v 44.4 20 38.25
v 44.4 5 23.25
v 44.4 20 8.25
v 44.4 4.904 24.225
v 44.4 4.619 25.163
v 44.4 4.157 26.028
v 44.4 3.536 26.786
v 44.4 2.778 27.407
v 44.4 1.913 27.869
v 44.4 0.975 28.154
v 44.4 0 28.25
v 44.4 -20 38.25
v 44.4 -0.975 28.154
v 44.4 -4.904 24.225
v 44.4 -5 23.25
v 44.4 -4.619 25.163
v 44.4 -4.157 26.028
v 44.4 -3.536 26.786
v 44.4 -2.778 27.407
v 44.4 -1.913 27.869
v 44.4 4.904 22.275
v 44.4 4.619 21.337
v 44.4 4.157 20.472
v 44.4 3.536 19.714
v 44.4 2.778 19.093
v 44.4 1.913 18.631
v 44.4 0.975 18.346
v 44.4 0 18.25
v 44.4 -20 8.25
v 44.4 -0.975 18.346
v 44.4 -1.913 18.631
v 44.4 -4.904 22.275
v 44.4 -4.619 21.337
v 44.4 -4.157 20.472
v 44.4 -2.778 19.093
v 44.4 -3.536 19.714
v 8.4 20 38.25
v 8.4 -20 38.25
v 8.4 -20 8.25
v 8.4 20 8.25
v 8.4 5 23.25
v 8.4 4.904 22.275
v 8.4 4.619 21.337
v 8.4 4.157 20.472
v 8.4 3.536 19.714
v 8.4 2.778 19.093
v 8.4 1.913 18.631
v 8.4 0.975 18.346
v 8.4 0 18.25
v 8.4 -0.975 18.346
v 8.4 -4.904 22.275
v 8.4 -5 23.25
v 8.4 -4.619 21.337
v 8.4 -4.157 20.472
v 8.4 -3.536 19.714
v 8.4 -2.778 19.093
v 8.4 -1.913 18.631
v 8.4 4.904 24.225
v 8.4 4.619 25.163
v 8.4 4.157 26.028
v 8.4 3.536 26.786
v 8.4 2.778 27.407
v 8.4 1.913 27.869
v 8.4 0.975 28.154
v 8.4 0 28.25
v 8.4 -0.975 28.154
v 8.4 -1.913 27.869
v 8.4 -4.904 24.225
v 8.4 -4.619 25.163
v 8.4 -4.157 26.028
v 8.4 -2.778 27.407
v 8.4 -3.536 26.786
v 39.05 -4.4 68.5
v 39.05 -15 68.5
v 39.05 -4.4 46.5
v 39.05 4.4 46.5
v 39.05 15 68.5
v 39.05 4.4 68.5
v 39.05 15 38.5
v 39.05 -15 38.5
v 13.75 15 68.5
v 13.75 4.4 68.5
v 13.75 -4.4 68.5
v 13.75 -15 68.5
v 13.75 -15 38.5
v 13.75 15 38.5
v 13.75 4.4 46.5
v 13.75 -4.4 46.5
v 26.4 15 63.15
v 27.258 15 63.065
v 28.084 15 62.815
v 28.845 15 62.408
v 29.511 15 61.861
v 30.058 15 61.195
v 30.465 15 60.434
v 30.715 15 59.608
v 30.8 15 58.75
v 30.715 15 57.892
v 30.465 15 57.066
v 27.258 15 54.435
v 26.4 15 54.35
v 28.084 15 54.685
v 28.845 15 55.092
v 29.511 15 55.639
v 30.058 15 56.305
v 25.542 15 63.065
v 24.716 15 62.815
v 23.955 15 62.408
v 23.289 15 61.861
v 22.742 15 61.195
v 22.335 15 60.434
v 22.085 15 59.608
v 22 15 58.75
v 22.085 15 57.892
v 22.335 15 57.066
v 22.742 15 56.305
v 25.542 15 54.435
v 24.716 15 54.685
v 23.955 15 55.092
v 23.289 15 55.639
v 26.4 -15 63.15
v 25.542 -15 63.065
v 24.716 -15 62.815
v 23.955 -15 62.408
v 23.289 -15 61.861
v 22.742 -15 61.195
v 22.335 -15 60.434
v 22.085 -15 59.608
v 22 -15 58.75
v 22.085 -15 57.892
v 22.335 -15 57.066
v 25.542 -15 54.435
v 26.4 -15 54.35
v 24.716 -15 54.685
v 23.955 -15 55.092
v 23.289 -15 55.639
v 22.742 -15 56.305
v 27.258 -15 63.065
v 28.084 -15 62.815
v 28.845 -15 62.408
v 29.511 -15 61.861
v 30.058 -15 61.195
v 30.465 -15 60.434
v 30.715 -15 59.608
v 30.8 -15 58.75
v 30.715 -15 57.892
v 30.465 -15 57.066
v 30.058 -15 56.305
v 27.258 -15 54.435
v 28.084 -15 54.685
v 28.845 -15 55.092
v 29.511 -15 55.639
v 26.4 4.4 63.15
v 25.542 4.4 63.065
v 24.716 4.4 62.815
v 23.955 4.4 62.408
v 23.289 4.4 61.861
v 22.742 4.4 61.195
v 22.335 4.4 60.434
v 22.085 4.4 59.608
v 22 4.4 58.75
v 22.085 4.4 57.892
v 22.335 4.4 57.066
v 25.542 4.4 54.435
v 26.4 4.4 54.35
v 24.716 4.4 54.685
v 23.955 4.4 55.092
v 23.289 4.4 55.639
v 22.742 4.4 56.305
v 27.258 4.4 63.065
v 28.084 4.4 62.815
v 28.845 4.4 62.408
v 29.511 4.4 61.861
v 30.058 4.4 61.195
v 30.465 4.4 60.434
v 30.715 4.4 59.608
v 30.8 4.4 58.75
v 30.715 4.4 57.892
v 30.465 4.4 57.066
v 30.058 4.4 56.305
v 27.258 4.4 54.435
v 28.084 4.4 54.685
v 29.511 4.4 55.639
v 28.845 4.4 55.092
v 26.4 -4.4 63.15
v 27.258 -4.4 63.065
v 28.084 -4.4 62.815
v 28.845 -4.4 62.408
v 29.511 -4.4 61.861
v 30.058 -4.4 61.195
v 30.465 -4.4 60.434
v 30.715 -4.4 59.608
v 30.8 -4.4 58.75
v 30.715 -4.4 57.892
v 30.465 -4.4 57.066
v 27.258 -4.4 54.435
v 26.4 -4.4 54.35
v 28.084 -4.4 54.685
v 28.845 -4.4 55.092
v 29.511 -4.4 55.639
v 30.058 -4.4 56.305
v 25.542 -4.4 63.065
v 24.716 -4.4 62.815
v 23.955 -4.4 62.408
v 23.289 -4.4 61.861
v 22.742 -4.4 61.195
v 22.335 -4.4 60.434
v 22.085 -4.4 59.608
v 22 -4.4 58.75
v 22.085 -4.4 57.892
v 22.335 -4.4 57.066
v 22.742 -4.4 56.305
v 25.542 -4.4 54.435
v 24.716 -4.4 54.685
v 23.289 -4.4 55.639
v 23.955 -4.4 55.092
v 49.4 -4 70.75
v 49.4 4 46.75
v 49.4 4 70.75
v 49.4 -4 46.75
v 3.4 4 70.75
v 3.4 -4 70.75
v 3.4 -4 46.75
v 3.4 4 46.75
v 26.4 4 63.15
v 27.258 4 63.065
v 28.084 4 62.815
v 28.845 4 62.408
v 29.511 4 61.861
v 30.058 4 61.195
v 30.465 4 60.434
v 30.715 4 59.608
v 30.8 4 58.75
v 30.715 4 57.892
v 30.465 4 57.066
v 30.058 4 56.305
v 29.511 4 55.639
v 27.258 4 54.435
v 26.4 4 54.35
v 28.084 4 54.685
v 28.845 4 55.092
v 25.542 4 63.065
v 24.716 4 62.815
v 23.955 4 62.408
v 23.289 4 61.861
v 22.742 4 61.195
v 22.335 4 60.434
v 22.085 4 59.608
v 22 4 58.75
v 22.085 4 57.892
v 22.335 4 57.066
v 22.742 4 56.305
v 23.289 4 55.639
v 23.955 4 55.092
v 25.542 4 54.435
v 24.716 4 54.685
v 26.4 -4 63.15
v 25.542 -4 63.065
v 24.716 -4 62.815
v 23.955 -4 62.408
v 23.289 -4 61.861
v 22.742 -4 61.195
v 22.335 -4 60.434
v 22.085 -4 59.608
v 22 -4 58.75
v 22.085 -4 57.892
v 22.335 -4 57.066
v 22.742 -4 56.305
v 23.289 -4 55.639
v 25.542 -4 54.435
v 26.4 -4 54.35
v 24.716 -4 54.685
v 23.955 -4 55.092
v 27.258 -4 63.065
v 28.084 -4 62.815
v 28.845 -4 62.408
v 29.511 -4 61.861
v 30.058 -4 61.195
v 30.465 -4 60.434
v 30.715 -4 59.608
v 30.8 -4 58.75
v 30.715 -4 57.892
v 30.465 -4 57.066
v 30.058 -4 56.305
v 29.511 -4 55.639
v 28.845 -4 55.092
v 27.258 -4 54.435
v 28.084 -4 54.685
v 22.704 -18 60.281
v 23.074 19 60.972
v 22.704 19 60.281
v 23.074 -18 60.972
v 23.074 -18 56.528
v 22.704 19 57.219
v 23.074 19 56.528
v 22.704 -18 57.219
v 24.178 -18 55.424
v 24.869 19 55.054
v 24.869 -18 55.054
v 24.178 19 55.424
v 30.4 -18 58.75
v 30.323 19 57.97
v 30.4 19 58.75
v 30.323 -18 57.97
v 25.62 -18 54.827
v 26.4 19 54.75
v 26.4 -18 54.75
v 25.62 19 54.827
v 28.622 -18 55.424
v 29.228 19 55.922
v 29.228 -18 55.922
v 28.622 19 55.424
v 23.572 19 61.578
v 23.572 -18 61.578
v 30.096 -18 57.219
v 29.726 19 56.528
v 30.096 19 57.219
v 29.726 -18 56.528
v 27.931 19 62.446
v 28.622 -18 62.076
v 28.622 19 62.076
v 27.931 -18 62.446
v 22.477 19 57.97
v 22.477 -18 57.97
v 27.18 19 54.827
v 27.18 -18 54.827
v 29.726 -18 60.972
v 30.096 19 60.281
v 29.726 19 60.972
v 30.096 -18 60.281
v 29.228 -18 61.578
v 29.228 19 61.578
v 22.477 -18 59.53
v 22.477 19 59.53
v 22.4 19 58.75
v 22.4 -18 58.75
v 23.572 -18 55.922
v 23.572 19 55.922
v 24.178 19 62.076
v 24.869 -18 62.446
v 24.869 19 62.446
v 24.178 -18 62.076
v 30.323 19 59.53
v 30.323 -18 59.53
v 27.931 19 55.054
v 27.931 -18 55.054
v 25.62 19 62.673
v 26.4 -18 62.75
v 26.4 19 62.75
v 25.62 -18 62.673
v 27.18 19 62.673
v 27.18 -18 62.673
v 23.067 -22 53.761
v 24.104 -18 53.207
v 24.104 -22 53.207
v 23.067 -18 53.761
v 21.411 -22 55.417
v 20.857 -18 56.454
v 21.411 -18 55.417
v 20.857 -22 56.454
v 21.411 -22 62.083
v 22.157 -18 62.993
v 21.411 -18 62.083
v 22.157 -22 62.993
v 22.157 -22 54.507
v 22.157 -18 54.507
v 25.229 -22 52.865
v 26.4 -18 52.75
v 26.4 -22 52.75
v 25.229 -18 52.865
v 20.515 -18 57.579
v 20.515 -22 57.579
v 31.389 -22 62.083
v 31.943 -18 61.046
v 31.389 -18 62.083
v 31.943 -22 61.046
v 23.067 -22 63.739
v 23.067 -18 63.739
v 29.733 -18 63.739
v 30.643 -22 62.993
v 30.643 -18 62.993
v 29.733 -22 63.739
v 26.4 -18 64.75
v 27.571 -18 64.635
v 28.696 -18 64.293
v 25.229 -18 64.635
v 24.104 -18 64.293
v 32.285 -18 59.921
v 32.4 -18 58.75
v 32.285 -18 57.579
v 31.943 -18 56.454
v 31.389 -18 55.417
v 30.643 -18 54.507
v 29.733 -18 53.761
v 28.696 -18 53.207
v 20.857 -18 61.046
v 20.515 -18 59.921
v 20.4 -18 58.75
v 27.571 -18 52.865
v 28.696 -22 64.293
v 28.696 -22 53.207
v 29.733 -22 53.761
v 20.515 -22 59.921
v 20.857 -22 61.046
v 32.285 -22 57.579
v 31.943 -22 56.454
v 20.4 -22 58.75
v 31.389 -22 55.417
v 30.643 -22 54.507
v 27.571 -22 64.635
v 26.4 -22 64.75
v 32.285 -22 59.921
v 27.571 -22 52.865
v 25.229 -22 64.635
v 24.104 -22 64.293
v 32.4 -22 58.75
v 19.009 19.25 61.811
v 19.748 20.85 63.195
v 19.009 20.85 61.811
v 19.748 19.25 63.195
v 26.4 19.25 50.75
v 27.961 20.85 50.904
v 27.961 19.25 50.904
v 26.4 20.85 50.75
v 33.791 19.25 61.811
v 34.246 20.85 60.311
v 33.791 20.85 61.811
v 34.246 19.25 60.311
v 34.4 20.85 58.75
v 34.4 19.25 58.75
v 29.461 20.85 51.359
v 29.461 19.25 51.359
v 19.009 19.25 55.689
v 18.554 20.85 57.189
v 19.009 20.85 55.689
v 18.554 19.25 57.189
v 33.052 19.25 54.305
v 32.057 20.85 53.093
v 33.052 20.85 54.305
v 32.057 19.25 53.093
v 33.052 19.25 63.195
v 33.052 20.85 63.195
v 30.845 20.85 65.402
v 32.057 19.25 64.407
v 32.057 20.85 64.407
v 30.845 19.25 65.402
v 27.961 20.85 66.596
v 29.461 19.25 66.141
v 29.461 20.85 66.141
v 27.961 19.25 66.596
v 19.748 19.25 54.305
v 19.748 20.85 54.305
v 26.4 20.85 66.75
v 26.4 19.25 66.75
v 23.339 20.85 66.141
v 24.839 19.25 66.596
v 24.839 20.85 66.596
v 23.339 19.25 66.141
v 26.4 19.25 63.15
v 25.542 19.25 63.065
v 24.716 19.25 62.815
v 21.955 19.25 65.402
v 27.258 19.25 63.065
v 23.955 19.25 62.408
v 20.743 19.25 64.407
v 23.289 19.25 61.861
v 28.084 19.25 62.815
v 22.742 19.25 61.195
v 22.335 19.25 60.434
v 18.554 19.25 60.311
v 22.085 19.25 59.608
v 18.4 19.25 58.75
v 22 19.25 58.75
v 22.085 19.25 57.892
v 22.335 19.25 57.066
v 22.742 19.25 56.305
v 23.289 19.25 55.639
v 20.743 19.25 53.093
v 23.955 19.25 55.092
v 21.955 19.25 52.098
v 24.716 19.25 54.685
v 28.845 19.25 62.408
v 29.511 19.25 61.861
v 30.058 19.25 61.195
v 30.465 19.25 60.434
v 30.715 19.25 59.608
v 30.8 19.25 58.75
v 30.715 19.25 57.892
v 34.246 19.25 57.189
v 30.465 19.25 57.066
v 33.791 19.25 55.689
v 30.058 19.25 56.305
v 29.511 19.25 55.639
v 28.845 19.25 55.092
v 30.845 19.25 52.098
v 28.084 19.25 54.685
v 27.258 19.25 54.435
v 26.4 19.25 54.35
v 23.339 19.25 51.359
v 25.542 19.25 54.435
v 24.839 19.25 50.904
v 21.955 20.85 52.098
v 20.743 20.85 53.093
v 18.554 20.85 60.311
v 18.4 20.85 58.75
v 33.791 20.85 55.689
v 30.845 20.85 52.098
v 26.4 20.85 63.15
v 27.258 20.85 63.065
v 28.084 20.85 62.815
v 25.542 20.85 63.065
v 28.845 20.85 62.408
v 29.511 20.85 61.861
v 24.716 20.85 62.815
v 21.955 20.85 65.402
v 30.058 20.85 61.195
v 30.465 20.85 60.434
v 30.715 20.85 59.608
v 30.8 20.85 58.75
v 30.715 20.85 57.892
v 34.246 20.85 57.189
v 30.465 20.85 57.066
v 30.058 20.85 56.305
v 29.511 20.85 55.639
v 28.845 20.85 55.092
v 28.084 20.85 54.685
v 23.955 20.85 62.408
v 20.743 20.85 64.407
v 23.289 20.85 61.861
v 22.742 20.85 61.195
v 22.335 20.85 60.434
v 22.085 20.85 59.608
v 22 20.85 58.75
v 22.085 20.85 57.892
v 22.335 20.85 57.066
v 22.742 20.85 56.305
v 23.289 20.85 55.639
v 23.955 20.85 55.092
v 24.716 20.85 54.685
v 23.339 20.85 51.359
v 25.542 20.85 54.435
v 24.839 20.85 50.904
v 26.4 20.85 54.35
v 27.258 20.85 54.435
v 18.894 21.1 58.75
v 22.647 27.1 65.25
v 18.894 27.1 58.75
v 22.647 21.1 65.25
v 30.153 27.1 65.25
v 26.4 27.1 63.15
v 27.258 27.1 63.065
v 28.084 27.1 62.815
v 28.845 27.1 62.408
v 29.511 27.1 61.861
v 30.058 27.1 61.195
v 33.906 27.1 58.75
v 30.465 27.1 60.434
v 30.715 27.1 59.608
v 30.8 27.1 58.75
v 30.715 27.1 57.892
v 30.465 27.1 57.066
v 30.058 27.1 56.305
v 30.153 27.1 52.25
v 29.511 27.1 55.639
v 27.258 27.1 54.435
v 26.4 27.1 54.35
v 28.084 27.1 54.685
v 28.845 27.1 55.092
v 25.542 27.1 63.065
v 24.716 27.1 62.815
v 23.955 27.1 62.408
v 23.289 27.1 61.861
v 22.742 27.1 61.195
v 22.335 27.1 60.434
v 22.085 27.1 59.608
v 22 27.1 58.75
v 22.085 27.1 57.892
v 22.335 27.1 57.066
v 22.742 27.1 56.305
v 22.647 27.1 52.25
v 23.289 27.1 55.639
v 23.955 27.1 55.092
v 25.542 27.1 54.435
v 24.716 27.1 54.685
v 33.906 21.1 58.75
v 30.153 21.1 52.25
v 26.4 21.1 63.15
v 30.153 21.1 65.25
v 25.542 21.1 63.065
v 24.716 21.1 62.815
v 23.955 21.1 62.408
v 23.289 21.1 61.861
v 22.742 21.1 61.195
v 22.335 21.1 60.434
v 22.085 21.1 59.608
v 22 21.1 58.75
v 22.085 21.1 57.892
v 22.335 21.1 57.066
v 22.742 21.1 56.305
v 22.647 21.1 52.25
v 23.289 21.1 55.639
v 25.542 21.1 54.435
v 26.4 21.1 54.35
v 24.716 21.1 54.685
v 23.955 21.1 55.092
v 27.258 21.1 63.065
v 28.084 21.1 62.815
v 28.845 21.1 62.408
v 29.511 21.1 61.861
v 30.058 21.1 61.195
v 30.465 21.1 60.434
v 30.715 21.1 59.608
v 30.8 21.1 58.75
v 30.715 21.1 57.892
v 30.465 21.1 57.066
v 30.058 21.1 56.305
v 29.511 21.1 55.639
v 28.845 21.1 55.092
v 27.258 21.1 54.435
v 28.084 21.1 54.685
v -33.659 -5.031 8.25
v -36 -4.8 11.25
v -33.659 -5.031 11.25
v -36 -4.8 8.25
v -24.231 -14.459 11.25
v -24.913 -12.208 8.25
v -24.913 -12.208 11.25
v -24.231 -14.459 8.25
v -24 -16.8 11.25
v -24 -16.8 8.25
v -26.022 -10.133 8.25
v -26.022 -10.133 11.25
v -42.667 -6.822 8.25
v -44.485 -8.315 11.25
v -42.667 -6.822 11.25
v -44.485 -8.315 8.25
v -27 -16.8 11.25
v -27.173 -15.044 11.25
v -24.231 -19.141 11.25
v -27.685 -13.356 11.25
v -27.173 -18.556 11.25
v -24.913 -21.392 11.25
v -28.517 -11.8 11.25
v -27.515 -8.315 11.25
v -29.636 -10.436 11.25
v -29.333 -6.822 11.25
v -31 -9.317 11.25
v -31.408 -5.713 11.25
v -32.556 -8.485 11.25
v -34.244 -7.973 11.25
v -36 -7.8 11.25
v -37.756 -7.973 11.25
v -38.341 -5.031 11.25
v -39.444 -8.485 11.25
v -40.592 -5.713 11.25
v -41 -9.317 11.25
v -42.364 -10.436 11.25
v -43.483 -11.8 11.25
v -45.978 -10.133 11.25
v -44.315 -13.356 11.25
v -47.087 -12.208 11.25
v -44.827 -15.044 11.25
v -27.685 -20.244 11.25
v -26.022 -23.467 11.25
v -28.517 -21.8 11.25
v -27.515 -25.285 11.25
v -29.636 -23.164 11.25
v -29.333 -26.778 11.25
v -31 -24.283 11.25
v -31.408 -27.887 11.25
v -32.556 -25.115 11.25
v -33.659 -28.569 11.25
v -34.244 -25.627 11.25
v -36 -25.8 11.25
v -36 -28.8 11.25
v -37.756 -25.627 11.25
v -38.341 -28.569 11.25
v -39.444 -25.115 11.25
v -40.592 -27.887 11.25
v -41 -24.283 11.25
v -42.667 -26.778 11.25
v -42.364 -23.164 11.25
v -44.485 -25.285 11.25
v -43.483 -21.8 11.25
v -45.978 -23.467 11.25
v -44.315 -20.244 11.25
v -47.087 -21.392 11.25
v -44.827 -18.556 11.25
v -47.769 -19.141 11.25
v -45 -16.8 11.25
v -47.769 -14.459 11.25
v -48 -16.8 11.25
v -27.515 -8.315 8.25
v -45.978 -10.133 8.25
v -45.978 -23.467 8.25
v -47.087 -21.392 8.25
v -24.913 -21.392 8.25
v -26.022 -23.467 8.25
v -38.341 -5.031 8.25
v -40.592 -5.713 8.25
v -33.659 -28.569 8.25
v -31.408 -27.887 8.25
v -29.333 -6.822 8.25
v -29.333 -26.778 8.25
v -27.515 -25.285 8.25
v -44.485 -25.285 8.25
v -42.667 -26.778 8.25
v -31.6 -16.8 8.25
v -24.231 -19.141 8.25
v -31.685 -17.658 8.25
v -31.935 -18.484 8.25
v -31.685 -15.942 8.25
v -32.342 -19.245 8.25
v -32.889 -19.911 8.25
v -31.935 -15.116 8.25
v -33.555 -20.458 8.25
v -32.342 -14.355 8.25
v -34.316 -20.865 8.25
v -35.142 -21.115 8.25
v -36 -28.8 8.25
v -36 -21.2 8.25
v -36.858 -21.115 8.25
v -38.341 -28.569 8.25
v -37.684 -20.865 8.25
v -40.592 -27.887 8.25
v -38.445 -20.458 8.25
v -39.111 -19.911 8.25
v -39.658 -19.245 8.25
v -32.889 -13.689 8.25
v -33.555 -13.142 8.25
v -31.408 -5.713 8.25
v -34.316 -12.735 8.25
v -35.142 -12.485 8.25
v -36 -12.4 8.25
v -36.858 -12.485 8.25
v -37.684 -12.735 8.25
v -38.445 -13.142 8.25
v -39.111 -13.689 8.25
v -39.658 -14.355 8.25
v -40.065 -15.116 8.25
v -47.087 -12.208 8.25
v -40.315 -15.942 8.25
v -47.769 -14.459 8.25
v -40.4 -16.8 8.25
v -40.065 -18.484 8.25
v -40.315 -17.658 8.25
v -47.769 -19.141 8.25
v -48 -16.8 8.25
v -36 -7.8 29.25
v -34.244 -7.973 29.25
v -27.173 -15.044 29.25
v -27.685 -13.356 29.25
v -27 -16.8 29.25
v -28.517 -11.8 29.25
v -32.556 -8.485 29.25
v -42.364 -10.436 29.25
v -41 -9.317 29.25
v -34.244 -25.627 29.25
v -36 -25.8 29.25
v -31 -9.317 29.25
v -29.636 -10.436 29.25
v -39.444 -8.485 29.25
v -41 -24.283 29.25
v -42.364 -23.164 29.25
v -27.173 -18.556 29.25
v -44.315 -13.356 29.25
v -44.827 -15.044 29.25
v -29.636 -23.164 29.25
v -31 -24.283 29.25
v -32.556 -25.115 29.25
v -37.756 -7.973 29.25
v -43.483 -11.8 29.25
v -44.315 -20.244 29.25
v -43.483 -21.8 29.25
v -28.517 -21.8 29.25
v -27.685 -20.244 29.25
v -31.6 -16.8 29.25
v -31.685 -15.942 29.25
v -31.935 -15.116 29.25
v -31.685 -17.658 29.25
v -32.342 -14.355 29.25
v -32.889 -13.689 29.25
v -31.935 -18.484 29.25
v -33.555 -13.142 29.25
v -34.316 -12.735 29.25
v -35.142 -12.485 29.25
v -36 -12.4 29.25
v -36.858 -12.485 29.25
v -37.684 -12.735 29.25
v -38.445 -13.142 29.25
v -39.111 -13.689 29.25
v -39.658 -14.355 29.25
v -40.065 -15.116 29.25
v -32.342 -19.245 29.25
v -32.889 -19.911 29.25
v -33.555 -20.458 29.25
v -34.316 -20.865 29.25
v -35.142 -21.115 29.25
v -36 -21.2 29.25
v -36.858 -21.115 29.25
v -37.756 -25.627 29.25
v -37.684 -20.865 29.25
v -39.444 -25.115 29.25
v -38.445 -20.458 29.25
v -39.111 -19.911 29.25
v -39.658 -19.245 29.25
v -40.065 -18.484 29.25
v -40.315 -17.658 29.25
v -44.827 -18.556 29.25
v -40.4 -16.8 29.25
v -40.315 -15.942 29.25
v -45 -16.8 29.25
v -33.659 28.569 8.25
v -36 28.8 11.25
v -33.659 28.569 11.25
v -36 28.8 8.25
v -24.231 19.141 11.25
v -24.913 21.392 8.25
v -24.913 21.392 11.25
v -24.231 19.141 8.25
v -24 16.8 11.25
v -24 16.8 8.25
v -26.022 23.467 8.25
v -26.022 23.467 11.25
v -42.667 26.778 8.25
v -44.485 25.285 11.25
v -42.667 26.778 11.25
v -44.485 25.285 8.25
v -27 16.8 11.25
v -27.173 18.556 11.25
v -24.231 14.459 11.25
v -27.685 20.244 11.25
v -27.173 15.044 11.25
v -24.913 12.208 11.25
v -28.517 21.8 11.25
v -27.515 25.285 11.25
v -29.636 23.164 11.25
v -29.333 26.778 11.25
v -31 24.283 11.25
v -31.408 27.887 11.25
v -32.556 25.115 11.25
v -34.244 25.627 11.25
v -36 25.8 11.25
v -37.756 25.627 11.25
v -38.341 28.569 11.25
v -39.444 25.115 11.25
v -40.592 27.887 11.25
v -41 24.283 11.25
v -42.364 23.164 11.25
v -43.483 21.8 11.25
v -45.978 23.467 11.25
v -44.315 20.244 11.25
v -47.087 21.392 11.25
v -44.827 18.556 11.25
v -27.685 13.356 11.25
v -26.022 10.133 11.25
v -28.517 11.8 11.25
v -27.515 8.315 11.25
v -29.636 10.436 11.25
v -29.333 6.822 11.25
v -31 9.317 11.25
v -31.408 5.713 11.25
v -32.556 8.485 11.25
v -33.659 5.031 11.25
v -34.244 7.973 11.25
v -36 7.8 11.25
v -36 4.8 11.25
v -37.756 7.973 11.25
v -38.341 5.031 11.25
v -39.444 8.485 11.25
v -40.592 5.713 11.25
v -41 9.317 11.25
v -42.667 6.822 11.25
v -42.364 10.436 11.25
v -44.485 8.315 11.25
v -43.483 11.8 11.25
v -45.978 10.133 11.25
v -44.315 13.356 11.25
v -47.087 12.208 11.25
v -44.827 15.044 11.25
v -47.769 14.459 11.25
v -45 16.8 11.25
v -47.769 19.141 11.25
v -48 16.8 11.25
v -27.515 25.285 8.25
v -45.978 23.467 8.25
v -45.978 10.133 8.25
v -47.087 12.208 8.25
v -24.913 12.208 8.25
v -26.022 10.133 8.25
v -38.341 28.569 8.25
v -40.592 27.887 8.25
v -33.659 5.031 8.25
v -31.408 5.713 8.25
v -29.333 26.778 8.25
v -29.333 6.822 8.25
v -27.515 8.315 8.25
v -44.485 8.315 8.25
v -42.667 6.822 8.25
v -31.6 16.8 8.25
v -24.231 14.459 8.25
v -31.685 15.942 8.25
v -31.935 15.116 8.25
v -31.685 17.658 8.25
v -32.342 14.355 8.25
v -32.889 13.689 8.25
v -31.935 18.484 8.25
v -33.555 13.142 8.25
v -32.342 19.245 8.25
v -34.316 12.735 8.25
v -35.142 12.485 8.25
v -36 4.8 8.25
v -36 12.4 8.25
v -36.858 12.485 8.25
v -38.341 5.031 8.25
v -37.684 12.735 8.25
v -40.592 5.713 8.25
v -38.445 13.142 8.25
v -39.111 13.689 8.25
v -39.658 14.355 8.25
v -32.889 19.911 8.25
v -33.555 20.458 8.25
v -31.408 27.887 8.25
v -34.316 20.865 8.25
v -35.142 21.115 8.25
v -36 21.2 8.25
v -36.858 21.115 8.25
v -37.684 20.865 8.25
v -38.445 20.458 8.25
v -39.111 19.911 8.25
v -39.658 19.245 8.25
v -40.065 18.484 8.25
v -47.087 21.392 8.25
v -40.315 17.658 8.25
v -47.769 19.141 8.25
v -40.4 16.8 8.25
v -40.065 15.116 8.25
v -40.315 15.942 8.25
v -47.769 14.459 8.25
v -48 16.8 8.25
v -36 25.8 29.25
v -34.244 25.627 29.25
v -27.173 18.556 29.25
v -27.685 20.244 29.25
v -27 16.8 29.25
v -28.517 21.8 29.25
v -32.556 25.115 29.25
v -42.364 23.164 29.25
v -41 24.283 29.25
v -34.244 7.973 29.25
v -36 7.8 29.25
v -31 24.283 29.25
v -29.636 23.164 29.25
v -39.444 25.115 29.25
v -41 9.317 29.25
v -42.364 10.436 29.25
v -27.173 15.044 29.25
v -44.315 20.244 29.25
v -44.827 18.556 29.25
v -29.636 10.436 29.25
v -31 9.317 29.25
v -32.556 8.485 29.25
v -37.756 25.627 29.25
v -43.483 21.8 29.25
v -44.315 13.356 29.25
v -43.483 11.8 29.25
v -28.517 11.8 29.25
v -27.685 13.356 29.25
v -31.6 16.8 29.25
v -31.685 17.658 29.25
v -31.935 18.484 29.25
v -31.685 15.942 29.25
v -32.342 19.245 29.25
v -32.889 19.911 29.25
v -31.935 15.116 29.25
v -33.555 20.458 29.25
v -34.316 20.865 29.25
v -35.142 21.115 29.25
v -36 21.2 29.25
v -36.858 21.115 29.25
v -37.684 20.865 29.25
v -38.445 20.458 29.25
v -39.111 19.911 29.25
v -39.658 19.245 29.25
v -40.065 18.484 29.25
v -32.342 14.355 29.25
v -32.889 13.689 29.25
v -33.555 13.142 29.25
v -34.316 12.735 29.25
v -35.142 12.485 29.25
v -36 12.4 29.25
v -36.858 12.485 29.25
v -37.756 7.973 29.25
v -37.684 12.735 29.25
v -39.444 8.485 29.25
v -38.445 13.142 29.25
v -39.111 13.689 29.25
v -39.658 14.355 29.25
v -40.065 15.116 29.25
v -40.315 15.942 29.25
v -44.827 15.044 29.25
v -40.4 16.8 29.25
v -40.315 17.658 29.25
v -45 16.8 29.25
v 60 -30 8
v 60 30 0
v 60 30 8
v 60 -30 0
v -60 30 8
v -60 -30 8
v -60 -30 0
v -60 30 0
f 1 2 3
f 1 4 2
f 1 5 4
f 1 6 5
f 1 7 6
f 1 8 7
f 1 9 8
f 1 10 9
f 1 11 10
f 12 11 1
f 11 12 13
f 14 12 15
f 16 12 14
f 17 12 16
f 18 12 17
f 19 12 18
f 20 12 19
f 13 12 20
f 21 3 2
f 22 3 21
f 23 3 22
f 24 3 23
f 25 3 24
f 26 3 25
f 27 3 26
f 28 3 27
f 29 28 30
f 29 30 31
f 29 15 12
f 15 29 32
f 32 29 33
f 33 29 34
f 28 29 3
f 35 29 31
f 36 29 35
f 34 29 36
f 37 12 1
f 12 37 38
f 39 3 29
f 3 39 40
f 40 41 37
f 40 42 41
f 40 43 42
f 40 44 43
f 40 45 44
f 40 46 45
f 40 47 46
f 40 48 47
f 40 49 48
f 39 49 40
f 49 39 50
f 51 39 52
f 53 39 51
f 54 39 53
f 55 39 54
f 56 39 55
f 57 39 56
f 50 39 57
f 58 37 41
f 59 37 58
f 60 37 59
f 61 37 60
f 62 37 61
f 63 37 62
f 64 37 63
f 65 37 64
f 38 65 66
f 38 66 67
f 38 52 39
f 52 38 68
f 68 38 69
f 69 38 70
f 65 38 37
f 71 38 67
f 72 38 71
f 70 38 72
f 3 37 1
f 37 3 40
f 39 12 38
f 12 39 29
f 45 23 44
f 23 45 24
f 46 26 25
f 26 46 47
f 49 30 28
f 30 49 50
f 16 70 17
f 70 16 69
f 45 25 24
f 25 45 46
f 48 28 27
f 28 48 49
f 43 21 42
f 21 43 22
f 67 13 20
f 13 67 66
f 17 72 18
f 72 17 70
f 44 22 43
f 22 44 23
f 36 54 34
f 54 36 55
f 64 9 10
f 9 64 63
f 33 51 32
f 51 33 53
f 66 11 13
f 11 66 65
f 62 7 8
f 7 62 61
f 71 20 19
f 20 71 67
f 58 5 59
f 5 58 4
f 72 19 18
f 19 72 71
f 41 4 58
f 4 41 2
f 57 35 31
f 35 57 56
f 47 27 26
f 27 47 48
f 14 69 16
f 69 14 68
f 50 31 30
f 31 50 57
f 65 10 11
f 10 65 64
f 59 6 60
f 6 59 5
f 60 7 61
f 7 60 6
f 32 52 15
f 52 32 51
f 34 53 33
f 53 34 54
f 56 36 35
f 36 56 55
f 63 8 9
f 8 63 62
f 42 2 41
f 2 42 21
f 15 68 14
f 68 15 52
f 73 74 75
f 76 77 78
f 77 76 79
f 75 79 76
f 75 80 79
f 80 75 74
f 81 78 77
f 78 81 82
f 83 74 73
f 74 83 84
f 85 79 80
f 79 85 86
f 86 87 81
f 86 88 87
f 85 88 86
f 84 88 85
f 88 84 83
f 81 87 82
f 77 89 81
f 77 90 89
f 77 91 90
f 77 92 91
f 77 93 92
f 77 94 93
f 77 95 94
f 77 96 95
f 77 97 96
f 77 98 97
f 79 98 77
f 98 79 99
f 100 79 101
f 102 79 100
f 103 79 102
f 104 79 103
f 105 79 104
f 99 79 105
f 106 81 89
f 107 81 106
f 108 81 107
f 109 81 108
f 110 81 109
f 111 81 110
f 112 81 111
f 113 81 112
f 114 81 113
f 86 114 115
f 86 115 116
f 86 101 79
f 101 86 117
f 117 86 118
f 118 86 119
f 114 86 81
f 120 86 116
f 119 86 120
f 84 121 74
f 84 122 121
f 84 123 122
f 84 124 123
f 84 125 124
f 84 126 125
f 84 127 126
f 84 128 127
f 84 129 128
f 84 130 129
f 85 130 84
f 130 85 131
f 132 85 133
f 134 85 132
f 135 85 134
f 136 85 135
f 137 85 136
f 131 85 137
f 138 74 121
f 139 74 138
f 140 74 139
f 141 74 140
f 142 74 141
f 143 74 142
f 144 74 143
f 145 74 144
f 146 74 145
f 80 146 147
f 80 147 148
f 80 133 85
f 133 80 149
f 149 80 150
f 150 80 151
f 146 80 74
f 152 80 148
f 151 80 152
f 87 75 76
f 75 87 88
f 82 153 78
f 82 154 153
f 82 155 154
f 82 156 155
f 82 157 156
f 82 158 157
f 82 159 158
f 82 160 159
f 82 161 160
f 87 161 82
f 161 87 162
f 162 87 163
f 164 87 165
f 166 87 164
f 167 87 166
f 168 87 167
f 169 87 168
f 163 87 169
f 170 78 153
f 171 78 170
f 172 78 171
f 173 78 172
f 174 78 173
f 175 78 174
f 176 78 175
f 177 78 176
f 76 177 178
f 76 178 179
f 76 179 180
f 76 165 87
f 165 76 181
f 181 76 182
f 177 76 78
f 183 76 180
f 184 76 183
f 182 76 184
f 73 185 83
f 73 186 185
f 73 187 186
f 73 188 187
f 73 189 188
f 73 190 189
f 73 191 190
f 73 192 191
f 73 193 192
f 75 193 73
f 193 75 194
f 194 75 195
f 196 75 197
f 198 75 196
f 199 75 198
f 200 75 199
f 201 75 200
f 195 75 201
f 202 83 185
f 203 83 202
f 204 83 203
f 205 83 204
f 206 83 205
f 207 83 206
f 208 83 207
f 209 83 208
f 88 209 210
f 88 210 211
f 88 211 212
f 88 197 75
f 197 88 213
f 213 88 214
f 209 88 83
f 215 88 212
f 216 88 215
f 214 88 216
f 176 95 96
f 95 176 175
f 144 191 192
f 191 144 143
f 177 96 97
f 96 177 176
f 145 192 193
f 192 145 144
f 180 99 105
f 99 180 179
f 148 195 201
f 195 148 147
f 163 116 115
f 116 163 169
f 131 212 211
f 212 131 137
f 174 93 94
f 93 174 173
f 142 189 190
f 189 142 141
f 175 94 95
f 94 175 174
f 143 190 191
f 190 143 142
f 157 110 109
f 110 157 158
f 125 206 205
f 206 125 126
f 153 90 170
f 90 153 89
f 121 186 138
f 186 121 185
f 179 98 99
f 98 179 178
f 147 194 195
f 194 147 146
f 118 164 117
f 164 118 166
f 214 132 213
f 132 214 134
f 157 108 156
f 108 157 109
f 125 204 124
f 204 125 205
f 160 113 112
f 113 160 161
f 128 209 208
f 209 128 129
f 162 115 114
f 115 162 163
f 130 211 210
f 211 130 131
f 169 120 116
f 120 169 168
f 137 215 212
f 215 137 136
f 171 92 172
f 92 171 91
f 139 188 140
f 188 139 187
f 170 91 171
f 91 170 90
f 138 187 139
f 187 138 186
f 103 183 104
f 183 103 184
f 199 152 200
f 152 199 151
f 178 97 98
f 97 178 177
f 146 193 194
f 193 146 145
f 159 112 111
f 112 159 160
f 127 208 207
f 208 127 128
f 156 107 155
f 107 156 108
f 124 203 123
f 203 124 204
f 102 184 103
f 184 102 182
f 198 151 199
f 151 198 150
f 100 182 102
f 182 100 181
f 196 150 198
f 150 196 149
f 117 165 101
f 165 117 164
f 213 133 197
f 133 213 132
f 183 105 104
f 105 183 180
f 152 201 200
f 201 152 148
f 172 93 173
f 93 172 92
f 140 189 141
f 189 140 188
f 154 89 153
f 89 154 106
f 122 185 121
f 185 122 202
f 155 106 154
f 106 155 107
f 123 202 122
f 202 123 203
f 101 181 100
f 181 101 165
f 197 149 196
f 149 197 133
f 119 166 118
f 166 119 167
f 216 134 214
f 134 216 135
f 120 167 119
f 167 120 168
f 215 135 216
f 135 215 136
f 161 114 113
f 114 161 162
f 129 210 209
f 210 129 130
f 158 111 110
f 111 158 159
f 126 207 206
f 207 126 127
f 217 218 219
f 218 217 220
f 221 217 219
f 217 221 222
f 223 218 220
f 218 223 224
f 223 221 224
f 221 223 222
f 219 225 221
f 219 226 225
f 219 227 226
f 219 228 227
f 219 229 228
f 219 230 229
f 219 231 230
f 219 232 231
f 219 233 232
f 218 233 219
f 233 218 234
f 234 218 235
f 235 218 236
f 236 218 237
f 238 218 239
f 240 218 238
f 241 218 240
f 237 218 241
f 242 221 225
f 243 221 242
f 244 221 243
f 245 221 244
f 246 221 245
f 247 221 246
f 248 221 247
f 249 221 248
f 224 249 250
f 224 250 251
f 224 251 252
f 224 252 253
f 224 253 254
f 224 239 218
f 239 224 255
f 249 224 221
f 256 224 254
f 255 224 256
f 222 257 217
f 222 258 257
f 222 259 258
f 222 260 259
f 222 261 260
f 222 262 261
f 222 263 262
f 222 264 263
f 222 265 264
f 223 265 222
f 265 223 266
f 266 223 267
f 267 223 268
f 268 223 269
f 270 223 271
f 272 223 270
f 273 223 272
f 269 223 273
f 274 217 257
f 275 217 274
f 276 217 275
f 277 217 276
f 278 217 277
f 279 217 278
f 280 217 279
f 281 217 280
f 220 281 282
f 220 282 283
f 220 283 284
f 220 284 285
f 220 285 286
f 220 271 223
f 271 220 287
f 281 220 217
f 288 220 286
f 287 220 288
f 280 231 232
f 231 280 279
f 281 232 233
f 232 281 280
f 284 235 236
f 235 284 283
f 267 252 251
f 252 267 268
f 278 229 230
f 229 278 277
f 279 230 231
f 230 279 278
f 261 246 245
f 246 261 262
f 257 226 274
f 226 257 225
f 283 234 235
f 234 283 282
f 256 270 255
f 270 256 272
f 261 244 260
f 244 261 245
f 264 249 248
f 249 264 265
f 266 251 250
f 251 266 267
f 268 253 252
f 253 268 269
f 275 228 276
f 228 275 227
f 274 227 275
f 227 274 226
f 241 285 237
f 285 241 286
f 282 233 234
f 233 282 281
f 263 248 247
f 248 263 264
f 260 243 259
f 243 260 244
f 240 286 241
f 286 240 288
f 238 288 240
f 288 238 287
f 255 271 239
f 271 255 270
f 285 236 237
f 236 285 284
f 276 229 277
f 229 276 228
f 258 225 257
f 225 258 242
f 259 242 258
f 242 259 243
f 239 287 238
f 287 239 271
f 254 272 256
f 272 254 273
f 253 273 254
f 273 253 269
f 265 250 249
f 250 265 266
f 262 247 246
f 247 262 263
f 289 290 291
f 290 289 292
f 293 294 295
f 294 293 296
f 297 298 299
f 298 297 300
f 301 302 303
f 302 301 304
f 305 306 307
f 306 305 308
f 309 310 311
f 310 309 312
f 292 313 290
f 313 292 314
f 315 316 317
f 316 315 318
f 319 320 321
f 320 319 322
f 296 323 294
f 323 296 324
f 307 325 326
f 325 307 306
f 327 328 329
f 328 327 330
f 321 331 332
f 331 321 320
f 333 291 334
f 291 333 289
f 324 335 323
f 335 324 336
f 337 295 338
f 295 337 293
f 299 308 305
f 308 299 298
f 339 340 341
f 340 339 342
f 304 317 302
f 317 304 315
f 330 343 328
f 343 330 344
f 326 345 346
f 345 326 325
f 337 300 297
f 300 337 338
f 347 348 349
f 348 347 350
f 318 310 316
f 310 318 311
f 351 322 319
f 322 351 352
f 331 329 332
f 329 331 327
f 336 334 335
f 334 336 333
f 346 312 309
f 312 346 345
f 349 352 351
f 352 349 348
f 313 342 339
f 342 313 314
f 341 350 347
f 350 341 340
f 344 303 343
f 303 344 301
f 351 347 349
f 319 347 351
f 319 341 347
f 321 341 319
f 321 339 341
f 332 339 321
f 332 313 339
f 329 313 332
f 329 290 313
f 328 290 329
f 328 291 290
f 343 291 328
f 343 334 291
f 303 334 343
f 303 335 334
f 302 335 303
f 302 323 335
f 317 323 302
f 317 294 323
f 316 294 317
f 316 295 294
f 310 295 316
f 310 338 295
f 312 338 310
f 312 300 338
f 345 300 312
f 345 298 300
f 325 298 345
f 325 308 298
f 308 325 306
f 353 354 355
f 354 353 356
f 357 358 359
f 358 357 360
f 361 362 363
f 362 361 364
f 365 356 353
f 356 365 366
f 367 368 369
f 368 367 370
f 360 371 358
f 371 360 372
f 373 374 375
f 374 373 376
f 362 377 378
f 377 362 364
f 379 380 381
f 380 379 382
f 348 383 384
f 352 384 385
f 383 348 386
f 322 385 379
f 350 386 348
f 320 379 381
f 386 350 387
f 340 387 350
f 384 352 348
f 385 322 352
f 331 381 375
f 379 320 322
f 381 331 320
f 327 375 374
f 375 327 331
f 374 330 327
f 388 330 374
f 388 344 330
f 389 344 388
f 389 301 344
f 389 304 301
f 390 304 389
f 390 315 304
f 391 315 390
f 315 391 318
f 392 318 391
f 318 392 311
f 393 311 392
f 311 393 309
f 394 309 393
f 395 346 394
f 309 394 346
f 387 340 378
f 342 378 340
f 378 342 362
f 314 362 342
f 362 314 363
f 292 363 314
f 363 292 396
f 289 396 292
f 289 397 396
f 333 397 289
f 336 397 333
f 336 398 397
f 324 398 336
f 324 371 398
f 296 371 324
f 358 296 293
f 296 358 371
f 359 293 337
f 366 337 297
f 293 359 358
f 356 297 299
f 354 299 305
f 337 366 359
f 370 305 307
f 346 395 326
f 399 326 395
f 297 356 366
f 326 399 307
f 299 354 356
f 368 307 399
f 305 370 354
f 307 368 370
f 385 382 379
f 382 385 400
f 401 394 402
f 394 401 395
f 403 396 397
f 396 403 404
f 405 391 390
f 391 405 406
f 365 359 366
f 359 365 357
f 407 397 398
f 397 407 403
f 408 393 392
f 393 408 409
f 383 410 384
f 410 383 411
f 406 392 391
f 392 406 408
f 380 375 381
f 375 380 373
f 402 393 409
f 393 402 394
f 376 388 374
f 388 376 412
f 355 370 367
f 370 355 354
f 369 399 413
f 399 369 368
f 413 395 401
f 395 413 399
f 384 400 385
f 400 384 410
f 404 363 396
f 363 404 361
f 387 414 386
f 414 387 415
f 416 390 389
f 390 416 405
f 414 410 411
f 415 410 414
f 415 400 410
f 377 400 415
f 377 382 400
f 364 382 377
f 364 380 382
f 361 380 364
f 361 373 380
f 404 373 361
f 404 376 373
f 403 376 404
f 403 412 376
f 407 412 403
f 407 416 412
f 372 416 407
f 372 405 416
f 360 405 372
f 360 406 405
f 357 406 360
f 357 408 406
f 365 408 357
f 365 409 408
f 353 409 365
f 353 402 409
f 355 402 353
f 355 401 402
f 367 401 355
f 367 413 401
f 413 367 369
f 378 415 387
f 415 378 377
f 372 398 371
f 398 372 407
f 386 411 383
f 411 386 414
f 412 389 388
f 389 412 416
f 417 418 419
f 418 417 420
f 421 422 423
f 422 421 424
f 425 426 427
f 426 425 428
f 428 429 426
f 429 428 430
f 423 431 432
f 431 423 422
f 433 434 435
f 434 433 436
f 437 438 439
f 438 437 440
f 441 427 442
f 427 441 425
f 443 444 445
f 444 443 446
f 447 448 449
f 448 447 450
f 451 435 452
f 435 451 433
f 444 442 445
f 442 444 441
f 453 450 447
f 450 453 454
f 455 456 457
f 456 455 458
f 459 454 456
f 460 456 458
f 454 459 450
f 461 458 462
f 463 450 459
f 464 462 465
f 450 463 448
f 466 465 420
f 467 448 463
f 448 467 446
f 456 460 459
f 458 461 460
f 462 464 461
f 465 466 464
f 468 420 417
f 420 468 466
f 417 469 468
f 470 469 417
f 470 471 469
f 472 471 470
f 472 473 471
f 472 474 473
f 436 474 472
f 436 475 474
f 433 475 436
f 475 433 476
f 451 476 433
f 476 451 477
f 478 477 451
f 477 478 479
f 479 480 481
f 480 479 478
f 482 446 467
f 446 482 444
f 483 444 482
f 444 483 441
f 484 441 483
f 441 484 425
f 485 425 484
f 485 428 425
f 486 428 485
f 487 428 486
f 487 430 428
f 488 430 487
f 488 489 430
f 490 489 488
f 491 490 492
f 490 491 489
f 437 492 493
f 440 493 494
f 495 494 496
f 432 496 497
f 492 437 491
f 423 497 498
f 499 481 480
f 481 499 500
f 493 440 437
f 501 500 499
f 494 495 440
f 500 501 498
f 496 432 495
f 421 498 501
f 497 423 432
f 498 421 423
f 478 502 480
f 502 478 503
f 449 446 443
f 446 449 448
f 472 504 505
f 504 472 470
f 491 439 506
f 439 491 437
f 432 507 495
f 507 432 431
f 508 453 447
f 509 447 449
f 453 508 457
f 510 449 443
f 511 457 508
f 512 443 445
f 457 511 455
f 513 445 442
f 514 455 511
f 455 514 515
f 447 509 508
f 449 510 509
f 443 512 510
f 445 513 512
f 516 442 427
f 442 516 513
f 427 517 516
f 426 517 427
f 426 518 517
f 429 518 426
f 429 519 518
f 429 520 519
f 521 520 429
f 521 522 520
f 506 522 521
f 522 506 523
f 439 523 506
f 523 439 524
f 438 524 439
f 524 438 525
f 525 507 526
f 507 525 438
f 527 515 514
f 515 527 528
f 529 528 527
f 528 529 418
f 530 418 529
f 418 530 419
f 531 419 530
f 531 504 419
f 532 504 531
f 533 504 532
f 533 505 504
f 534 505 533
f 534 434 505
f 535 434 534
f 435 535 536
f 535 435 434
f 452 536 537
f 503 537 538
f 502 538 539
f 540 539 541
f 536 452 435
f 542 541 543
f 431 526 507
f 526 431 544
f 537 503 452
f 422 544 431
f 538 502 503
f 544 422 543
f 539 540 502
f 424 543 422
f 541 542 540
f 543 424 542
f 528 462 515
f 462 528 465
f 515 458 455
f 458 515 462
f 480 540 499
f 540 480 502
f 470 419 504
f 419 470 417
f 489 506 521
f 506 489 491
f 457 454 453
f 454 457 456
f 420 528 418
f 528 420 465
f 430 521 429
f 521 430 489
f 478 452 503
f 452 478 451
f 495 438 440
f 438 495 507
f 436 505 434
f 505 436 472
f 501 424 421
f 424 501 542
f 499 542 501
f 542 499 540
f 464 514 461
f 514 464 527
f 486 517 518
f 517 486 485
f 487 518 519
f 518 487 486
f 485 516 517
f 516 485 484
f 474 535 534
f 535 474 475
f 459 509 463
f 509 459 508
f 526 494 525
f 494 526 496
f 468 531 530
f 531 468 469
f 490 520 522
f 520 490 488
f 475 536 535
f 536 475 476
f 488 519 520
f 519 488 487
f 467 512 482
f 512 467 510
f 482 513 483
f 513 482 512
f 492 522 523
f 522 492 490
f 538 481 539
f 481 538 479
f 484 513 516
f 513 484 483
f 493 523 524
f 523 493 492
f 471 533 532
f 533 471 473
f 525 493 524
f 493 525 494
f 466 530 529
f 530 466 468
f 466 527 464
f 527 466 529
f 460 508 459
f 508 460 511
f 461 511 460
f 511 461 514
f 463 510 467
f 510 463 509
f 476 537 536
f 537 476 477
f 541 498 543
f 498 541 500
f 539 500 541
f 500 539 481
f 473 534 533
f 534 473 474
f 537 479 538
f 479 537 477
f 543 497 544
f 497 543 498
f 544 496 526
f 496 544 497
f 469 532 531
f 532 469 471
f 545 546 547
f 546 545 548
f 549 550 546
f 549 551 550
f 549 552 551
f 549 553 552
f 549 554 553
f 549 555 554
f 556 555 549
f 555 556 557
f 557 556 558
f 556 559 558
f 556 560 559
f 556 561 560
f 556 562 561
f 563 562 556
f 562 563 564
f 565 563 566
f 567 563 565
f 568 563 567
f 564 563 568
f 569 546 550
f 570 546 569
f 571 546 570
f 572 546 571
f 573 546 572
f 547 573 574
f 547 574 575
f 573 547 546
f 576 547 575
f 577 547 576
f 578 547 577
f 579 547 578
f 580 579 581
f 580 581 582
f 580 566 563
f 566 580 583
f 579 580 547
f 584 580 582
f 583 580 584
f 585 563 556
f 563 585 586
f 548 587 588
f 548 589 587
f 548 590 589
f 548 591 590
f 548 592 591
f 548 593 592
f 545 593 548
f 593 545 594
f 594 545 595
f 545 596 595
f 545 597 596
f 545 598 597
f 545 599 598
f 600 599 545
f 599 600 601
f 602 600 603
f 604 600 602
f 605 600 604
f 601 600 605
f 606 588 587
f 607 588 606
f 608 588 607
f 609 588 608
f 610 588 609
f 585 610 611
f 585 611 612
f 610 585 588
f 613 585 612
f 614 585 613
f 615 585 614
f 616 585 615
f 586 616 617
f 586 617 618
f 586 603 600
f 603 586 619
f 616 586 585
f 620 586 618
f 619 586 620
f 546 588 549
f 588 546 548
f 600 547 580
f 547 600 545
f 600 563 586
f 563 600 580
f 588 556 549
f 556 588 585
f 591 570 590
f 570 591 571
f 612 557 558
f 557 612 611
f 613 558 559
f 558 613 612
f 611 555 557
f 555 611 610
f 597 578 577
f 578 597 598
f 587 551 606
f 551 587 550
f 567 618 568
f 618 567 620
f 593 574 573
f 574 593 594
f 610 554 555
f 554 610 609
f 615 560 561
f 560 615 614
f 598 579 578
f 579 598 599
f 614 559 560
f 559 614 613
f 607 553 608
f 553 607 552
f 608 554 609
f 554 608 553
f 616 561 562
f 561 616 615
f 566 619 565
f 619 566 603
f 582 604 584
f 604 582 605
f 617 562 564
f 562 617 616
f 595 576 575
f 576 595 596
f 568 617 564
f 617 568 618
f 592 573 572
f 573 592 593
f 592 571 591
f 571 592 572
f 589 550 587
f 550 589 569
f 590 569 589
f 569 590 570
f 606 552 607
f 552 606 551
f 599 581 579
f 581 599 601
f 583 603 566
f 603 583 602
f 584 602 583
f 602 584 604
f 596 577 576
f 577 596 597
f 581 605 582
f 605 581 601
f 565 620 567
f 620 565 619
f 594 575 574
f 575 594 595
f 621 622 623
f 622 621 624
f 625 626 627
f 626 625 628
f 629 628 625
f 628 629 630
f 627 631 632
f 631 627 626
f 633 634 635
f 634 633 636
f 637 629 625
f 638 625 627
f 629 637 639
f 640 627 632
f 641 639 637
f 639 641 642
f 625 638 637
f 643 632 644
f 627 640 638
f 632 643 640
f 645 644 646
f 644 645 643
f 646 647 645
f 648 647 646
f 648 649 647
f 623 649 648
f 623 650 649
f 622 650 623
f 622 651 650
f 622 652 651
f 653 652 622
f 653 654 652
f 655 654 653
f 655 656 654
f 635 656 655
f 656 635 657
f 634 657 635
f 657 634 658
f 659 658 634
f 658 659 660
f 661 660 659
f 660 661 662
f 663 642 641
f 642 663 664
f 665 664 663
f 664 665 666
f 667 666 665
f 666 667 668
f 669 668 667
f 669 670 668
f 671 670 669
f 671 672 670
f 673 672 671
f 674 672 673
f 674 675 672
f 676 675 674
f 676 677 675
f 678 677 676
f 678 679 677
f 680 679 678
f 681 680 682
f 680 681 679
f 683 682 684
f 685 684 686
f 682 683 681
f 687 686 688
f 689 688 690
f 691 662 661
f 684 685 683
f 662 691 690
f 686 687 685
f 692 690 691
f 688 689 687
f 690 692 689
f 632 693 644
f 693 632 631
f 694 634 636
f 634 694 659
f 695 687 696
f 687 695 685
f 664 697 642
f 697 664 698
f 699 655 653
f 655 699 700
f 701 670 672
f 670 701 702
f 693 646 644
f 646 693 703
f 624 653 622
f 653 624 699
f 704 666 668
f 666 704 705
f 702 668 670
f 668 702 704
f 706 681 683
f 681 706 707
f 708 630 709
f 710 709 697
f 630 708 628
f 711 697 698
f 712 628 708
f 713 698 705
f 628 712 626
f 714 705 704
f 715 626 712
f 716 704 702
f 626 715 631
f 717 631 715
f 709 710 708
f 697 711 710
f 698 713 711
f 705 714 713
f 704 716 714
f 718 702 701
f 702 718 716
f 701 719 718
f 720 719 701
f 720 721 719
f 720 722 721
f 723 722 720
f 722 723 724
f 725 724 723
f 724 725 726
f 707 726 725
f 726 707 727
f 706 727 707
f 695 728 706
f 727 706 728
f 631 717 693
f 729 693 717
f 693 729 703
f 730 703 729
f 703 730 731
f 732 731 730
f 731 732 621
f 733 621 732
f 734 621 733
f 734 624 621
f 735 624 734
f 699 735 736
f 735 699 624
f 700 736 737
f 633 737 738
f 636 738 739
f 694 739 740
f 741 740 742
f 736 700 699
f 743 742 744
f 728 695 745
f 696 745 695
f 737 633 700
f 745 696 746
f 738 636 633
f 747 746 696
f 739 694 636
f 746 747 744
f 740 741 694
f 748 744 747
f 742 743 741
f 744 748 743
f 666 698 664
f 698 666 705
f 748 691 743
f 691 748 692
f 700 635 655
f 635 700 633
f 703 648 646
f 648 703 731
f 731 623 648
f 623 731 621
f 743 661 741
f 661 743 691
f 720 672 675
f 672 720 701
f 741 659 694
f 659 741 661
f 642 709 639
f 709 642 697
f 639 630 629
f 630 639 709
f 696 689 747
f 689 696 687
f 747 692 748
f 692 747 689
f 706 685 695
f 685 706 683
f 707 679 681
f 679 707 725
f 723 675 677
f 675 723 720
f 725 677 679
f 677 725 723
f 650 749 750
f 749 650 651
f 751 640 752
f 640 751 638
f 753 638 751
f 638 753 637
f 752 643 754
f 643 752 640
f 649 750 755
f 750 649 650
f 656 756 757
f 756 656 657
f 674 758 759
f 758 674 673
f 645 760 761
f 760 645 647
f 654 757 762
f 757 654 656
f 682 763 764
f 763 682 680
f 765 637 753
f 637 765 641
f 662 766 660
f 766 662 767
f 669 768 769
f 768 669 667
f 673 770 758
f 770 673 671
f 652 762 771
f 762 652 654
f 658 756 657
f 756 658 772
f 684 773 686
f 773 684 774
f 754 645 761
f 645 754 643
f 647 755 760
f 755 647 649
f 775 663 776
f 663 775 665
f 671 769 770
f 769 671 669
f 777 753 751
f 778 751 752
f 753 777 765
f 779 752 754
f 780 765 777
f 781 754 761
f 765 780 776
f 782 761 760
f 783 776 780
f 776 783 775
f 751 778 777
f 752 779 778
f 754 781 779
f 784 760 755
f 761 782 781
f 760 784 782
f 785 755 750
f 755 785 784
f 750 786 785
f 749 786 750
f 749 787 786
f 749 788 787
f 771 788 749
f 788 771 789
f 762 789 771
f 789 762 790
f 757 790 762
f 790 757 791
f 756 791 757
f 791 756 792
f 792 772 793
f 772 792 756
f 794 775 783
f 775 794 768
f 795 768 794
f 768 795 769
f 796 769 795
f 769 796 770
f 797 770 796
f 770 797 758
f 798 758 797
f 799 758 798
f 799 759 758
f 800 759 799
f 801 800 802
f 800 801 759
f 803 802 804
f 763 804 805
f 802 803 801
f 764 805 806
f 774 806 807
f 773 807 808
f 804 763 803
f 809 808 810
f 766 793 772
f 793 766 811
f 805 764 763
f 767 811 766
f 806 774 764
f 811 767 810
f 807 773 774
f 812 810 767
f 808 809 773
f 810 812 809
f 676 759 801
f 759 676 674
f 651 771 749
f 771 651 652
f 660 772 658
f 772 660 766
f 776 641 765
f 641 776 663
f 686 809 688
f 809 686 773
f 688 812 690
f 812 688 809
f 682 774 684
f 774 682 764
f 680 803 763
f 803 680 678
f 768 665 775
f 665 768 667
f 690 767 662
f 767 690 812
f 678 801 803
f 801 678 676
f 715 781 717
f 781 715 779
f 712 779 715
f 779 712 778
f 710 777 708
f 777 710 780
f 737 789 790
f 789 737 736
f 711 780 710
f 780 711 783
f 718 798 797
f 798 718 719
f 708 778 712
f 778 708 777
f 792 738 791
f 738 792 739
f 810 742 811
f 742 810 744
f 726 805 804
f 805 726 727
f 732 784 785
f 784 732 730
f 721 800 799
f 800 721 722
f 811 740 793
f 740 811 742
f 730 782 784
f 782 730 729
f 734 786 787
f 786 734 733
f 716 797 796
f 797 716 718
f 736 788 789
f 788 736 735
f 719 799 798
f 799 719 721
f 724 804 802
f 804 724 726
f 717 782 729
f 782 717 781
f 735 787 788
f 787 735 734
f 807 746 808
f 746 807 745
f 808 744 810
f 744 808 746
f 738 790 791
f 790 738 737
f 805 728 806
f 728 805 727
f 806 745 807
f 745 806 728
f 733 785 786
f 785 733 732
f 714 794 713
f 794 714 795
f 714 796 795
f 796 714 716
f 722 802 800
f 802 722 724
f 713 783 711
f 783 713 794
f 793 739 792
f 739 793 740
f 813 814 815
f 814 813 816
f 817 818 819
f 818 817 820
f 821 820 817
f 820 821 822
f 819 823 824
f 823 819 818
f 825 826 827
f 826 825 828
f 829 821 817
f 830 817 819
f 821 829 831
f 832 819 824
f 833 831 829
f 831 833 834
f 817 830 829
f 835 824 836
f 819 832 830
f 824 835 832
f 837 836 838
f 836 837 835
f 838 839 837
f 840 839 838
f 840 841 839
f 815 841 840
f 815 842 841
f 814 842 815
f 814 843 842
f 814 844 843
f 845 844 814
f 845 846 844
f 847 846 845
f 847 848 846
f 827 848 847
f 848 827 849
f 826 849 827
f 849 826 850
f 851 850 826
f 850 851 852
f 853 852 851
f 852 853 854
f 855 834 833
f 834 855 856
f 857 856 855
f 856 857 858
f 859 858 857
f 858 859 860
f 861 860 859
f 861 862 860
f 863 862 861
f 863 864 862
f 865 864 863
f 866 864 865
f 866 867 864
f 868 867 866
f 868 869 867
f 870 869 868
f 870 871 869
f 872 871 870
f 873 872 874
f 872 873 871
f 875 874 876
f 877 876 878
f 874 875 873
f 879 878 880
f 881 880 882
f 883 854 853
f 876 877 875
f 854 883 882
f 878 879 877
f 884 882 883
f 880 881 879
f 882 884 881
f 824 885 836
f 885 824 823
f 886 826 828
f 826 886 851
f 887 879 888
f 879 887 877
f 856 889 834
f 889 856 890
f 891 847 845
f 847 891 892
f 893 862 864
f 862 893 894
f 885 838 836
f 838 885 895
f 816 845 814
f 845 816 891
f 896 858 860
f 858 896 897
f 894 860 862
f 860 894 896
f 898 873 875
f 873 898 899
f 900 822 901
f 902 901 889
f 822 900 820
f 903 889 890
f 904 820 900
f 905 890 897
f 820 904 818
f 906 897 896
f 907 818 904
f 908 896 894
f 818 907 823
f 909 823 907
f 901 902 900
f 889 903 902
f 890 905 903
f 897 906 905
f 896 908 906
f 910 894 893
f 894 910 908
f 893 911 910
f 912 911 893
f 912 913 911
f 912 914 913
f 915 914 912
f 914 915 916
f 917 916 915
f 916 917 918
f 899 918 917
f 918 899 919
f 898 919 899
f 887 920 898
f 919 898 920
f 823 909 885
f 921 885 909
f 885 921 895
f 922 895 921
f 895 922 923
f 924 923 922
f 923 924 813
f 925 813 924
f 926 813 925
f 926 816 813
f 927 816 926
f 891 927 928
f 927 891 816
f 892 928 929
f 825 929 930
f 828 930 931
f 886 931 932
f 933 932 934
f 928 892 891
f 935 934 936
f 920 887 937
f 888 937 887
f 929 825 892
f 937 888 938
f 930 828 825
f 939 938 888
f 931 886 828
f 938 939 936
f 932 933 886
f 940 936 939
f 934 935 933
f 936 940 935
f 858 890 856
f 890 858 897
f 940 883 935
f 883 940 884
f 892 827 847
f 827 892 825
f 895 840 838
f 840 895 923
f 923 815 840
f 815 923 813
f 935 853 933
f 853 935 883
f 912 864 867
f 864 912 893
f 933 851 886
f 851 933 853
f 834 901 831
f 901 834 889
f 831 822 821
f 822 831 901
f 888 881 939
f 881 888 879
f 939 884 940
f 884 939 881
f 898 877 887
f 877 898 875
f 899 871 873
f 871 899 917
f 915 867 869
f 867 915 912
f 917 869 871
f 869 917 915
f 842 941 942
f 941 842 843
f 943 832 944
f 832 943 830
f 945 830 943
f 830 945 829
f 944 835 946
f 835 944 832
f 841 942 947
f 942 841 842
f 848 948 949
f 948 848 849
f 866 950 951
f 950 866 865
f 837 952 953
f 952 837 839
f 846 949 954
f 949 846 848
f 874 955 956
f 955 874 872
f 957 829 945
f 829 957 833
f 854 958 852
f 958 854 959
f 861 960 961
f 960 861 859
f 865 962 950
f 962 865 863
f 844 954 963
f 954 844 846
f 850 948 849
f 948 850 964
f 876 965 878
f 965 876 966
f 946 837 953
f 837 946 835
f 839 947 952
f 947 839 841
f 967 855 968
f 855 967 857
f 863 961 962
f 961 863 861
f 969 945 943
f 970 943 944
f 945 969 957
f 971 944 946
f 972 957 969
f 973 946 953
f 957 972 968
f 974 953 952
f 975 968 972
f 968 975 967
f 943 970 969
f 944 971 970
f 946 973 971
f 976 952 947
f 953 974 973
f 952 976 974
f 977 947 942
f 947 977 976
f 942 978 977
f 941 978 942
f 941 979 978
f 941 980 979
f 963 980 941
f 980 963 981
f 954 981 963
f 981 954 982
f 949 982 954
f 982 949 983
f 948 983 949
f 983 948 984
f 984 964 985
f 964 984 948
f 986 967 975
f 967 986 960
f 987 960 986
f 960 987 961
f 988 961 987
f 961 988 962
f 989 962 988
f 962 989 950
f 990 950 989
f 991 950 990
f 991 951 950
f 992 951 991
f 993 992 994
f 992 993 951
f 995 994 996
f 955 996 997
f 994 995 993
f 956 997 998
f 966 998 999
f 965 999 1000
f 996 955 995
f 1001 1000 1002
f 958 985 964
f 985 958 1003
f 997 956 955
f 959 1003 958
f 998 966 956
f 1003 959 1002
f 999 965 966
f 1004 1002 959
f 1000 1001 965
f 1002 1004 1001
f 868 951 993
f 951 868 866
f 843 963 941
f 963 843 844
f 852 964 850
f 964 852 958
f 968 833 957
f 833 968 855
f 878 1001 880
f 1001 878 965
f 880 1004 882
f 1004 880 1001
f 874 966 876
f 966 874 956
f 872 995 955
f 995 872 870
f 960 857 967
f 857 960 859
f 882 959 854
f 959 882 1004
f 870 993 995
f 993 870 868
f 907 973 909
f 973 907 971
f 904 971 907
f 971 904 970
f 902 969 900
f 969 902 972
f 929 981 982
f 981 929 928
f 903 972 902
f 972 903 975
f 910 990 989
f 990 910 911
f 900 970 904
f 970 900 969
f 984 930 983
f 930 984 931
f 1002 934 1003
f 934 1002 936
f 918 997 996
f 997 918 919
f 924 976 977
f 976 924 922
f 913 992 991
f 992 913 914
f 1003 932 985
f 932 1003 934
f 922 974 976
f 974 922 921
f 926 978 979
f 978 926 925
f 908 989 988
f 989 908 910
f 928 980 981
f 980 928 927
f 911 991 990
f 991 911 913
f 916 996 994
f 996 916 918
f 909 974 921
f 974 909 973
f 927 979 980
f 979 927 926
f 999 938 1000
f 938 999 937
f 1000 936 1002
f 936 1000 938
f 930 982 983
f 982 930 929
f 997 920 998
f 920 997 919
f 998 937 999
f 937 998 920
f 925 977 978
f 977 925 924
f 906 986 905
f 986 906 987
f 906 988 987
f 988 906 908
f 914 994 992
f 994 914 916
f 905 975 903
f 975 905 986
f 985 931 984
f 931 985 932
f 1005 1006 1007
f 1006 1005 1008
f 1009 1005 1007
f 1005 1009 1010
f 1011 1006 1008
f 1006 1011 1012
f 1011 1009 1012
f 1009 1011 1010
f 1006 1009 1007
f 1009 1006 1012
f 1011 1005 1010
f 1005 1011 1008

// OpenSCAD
$fn = 32;

// ------------------------------------------------------------------------
// Indexing jig: plate 120 x 60 mm, pin d8
// Every part is its own module, assembly() places every instance.
// ------------------------------------------------------------------------

// --- part 1 ---
module jig_plate() {
  difference() {
    translate([-60, -30, 0]) cube([120, 60, 8]);
  }
}

// --- part 2 ---
module locator_block() {
  difference() {
    translate([-18, -20, 0]) cube([36, 40, 30]);
    translate([0, 0, 15]) rotate([0, 90, 0]) cylinder(h = 38, d = 10, center = true);
  }
}

// --- part 3 ---
module index_fork() {
  difference() {
    translate([-12.65, -15, 0]) cube([25.3, 30, 30]);
    translate([-13.65, -4.4, 8]) cube([27.3, 8.8, 23]);
    translate([0, 0, 20.25]) rotate([90, 0, 0]) cylinder(h = 32, d = 8.8, center = true);
  }
}

// --- part 4 ---
module index_arm() {
  difference() {
    translate([-23, -4, 0]) cube([46, 8, 24]);
    translate([0, 0, 12]) rotate([90, 0, 0]) cylinder(h = 10, d = 8.8, center = true);
  }
}

// --- part 5 ---
module index_pin() {
  rotate([0, 90, 0]) cylinder(h = 38, d = 8, center = true);
  translate([-22, 0, 0]) rotate([0, 90, 0]) cylinder(h = 4, d = 12);
}

// --- part 6 ---
module pin_washer() {
  difference() {
      translate([0, 0, 0]) cylinder(h = 1.6, d = 16);
      translate([0, 0, -1]) cylinder(h = 3.6, d = 8.8);
    }
}

// --- part 7 ---
module lock_nut() {
  difference() {
    linear_extrude(height = 6) polygon(points = [[7.506, 0], [3.753, 6.5], [-3.753, 6.5], [-7.506, 0], [-3.753, -6.5], [3.753, -6.5]]);
    translate([0, 0, -1]) cylinder(h = 8, d = 8.8);
  }
}

// --- part 8 ---
module guide_bush_a() {
  difference() {
    union() {
      cylinder(h = 3, d = 24);
      translate([0, 0, 3]) cylinder(h = 18, d = 18);
    }
    translate([0, 0, -1]) cylinder(h = 23, d = 8.8);
  }
}

// --- part 9 ---
module guide_bush_b() {
  difference() {
    union() {
      cylinder(h = 3, d = 24);
      translate([0, 0, 3]) cylinder(h = 18, d = 18);
    }
    translate([0, 0, -1]) cylinder(h = 23, d = 8.8);
  }
}

// --- assembly ---
module assembly() {
  color([0.80, 0.24, 0.20]) translate([0, 0, 0]) rotate([0, 0, 0]) jig_plate();
  color([0.20, 0.45, 0.75]) translate([26.4, 0, 8.25]) rotate([0, 0, 0]) locator_block();
  color([0.25, 0.62, 0.32]) translate([26.4, 0, 38.5]) rotate([0, 0, 0]) index_fork();
  color([0.92, 0.70, 0.18]) translate([26.4, 0, 46.75]) rotate([0, 0, 0]) index_arm();
  color([0.58, 0.35, 0.70]) translate([26.4, 0, 58.75]) rotate([0, 0, 90]) index_pin();
  color([0.16, 0.66, 0.66]) translate([26.4, 20.85, 58.75]) rotate([90, 0, 0]) pin_washer();
  color([0.85, 0.48, 0.18]) translate([26.4, 27.1, 58.75]) rotate([90, 0, 0]) lock_nut();
  color([0.55, 0.60, 0.65]) translate([-36, -16.8, 8.25]) rotate([0, 0, 0]) guide_bush_a();
  color([0.75, 0.30, 0.55]) translate([-36, 16.8, 8.25]) rotate([0, 0, 0]) guide_bush_b();
}

assembly();
